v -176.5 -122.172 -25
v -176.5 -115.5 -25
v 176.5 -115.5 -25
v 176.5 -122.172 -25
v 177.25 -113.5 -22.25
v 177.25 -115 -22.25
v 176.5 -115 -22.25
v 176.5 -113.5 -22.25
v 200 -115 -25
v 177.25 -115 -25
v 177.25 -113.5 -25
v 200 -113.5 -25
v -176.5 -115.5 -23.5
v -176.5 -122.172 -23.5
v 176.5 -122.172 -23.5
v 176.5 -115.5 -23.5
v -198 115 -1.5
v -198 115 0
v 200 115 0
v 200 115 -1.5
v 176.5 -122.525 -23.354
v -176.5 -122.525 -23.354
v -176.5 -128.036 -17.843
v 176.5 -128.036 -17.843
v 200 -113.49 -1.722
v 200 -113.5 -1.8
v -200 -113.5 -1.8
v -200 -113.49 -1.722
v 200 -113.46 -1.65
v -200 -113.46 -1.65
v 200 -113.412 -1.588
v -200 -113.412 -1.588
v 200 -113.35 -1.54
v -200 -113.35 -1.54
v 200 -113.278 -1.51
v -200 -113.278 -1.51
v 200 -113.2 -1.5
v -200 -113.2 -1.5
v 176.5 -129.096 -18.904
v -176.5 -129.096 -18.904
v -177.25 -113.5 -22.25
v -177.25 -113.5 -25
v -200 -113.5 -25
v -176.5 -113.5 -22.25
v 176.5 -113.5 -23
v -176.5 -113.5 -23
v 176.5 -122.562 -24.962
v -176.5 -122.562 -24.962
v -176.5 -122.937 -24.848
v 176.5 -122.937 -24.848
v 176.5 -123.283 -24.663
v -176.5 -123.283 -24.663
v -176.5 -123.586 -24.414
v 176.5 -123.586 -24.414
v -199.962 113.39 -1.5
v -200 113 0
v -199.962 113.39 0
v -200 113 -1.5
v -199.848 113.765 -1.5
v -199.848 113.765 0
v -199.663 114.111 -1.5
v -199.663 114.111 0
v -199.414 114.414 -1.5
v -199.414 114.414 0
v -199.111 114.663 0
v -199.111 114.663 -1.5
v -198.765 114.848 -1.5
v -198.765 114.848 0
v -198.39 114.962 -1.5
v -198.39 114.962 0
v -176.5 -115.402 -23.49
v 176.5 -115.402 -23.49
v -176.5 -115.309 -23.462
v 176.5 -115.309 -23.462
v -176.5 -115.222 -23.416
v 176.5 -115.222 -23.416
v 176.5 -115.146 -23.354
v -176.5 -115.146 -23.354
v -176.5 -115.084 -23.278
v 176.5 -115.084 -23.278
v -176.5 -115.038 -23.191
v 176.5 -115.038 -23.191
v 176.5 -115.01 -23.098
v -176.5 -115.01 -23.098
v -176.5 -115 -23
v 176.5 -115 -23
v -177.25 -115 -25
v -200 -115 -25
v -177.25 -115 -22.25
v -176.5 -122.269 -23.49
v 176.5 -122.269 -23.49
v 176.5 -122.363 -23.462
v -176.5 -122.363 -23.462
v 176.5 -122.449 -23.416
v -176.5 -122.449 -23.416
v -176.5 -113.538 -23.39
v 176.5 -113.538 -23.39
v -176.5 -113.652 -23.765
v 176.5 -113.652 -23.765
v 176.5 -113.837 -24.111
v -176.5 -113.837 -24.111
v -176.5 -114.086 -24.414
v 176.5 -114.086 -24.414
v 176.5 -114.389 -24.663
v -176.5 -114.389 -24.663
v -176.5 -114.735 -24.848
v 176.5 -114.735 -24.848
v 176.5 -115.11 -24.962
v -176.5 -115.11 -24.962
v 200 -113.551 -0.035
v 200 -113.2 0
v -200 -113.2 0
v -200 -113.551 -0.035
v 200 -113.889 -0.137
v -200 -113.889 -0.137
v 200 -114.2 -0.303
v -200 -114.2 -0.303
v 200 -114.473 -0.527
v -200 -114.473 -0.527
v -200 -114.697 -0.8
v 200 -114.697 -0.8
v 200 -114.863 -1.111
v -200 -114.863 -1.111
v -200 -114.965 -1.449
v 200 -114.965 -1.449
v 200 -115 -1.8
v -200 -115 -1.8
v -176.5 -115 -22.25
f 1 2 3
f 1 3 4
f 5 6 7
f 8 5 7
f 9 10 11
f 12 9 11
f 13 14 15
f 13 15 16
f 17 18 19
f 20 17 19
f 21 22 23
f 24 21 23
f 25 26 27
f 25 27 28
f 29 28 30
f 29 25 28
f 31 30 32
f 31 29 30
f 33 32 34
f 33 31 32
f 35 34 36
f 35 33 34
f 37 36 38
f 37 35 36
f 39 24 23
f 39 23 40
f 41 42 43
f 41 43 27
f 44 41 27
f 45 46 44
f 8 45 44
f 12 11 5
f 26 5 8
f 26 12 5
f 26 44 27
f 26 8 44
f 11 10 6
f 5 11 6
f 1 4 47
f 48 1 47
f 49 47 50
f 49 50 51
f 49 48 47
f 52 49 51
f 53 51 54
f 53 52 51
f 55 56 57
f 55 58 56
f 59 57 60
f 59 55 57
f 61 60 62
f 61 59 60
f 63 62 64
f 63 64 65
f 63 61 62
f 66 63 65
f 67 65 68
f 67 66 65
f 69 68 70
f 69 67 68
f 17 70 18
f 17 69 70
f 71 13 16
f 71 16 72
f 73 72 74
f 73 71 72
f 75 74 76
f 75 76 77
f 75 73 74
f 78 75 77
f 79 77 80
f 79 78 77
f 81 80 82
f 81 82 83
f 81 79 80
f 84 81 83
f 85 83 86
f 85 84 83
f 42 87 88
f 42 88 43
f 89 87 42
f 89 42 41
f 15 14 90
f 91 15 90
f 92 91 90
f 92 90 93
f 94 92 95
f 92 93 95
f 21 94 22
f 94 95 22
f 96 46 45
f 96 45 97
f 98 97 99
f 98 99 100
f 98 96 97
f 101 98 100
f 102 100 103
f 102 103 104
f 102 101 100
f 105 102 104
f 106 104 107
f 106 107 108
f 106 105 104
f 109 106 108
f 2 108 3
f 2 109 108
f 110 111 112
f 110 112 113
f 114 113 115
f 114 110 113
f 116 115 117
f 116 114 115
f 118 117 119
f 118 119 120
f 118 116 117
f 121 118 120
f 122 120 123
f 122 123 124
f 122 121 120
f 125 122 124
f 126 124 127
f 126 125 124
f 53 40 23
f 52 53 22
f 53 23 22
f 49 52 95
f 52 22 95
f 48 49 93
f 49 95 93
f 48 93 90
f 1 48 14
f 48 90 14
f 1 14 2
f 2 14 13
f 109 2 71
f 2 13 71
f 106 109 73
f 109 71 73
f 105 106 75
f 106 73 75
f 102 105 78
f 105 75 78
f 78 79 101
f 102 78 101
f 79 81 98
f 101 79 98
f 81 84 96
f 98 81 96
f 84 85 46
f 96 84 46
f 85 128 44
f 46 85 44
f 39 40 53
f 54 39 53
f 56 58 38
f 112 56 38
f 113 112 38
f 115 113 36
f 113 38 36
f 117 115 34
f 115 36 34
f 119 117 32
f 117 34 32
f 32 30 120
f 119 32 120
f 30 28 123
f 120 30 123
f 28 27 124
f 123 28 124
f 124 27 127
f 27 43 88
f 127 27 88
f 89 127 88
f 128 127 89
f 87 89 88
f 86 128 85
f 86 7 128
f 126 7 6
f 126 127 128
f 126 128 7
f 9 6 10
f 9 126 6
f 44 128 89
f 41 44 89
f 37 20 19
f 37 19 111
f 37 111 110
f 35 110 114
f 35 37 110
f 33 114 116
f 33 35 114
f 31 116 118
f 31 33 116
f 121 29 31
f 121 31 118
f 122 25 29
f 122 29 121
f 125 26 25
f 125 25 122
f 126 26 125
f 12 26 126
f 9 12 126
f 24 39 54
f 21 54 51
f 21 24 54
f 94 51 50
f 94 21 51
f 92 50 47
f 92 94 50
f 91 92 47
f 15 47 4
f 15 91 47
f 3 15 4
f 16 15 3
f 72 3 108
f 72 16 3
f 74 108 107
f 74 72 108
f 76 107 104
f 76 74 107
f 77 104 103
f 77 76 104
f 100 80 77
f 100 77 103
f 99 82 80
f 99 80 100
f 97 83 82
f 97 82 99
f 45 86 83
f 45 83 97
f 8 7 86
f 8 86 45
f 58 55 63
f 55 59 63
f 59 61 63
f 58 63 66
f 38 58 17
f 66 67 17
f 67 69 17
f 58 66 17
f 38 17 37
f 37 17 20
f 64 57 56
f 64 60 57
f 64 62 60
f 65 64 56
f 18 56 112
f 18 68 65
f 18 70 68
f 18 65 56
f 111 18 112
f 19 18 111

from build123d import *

# Parameters (mm, degrees)
SKETCH_1_W                        = 400
SKETCH_1_H                        = 230
SM_BASE_FLANGE_1_DEPTH            = 1.5
SM_EDGE_FLANGE_1_STRIP_W          = 6.6
SM_EDGE_FLANGE_1_STRIP_H          = 1.5
SM_EDGE_FLANGE_1_STRIP_CUT_DEPTH  = 400
SM_EDGE_FLANGE_1_DEPTH            = 400
SM_EDGE_FLANGE_2_STRIP_W          = 7
SM_EDGE_FLANGE_2_STRIP_H          = 1.5
SM_EDGE_FLANGE_2_STRIP_CUT_DEPTH  = 353
SM_EDGE_FLANGE_2_RELIEF_W         = 7.75
SM_EDGE_FLANGE_2_RELIEF_H         = 0.75
SM_EDGE_FLANGE_2_RELIEF_CUT_DEPTH = 1.5
SM_EDGE_FLANGE_2_DEPTH            = 353
FILLET_1_R                        = 2
SM_START                          = -176.5
SM_EDGE_FLANGE_3_DEPTH            = 353
SM_EDGE_FLANGE_3_2_DEPTH          = 353


# Read off the part's stored shape, not the designer's step: 边线-法兰3
# Sheet-metal steps are written as plain solids
with BuildPart() as part:
    # Sketch 1 → 基体-法兰1 (new body)
    with BuildSketch(Plane.XY):
        Rectangle(SKETCH_1_W, SKETCH_1_H)
    extrude(amount=-SM_BASE_FLANGE_1_DEPTH)

    # 边线-法兰1 strip (across the edge) → 边线-法兰1 strip cut (cut)
    with BuildSketch(Plane(origin=(200, -115, -1.5), x_dir=(0, 1, 0), z_dir=(-1, 0, 0))):
        with Locations((-1.5, -0.75)):
            Rectangle(SM_EDGE_FLANGE_1_STRIP_W, SM_EDGE_FLANGE_1_STRIP_H)
    extrude(amount=SM_EDGE_FLANGE_1_STRIP_CUT_DEPTH, mode=Mode.SUBTRACT)

    # 边线-法兰1 section (across the edge) → 边线-法兰1 (add)
    with BuildSketch(Plane(origin=(200, -115, -1.5), x_dir=(0, 1, 0), z_dir=(-1, 0, 0))):
        with BuildLine():
            Line((0, 0.3), (0, 23.5))
            Line((0, 23.5), (1.5, 23.5))
            Line((1.5, 23.5), (1.5, 0.3))
            ThreePointArc((1.5, 0.3), (1.587867966, 0.087867966), (1.8, 0))
            Line((1.8, 0), (1.8, -1.5))
            ThreePointArc((1.8, -1.5), (0.527207794, -0.972792206), (0, 0.3))
        make_face()
    extrude(amount=SM_EDGE_FLANGE_1_DEPTH)

    # 边线-法兰2 strip (across the edge) → 边线-法兰2 strip cut (cut)
    with BuildSketch(Plane(origin=(-176.5, -115, -25), x_dir=(0, 0, 1), z_dir=(1, 0, 0))):
        with Locations((-1.5, -0.75)):
            Rectangle(SM_EDGE_FLANGE_2_STRIP_W, SM_EDGE_FLANGE_2_STRIP_H)
    extrude(amount=SM_EDGE_FLANGE_2_STRIP_CUT_DEPTH, mode=Mode.SUBTRACT)

    # 边线-法兰2 relief (on the sheet) → 边线-法兰2 relief cut (cut)
    with BuildSketch(Plane(origin=(-176.5, -115, -23), x_dir=(0, 0, 1), z_dir=(0, -1, 0))):
        with Locations((-3.125, 0.375)):
            Rectangle(SM_EDGE_FLANGE_2_RELIEF_W, SM_EDGE_FLANGE_2_RELIEF_H)
        with Locations((-3.125, -353.375)):
            Rectangle(SM_EDGE_FLANGE_2_RELIEF_W, SM_EDGE_FLANGE_2_RELIEF_H)
    extrude(amount=-SM_EDGE_FLANGE_2_RELIEF_CUT_DEPTH, mode=Mode.SUBTRACT)

    # 边线-法兰2 section (across the edge) → 边线-法兰2 (add)
    with BuildSketch(Plane(origin=(-176.5, -115, -25), x_dir=(0, 0, 1), z_dir=(1, 0, 0))):
        with BuildLine():
            Line((0, 0.5), (0, 9.5))
            Line((0, 9.5), (1.5, 9.5))
            Line((1.5, 9.5), (1.5, 0.5))
            ThreePointArc((1.5, 0.5), (1.646446609, 0.146446609), (2, 0))
            Line((2, 0), (2, -1.5))
            ThreePointArc((2, -1.5), (0.585786438, -0.914213562), (0, 0.5))
        make_face()
    extrude(amount=SM_EDGE_FLANGE_2_DEPTH)

    # 圆角1
    fillet_1_edges = [part.edges().sort_by_distance(p)[0] for p in [
        (-200, 115, -0.75),
    ]]
    fillet(fillet_1_edges, radius=FILLET_1_R)

    # 边线-法兰3 outline → 边线-法兰3 (cut)
    with BuildSketch(Plane.YZ.offset(SM_START)):
        with BuildLine():
            ThreePointArc((-122.171572875, -25), (-122.93693974, -24.847759065), (-123.585786438, -24.414213562))
            Line((-123.585786438, -24.414213562), (-124.5, -23.5))
            Line((-124.5, -23.5), (-124.5, -25))
            Line((-124.5, -25), (-122.171572875, -25))
        make_face()
    extrude(amount=SM_EDGE_FLANGE_3_DEPTH, mode=Mode.SUBTRACT)

    # Sm Edge Flange 3 2 outline → Sm Edge Flange 3 2 (add)
    with BuildSketch(Plane.YZ.offset(SM_START)):
        with BuildLine():
            Line((-129.096194078, -18.903805922), (-124.5, -23.5))
            Line((-124.5, -23.5), (-122.171572875, -23.5))
            ThreePointArc((-122.171572875, -23.5), (-122.362914591, -23.461939766), (-122.525126266, -23.353553391))
            Line((-122.525126266, -23.353553391), (-128.035533906, -17.843145751))
            Line((-128.035533906, -17.843145751), (-129.096194078, -18.903805922))
        make_face()
    extrude(amount=SM_EDGE_FLANGE_3_2_DEPTH)


solid = part.part
